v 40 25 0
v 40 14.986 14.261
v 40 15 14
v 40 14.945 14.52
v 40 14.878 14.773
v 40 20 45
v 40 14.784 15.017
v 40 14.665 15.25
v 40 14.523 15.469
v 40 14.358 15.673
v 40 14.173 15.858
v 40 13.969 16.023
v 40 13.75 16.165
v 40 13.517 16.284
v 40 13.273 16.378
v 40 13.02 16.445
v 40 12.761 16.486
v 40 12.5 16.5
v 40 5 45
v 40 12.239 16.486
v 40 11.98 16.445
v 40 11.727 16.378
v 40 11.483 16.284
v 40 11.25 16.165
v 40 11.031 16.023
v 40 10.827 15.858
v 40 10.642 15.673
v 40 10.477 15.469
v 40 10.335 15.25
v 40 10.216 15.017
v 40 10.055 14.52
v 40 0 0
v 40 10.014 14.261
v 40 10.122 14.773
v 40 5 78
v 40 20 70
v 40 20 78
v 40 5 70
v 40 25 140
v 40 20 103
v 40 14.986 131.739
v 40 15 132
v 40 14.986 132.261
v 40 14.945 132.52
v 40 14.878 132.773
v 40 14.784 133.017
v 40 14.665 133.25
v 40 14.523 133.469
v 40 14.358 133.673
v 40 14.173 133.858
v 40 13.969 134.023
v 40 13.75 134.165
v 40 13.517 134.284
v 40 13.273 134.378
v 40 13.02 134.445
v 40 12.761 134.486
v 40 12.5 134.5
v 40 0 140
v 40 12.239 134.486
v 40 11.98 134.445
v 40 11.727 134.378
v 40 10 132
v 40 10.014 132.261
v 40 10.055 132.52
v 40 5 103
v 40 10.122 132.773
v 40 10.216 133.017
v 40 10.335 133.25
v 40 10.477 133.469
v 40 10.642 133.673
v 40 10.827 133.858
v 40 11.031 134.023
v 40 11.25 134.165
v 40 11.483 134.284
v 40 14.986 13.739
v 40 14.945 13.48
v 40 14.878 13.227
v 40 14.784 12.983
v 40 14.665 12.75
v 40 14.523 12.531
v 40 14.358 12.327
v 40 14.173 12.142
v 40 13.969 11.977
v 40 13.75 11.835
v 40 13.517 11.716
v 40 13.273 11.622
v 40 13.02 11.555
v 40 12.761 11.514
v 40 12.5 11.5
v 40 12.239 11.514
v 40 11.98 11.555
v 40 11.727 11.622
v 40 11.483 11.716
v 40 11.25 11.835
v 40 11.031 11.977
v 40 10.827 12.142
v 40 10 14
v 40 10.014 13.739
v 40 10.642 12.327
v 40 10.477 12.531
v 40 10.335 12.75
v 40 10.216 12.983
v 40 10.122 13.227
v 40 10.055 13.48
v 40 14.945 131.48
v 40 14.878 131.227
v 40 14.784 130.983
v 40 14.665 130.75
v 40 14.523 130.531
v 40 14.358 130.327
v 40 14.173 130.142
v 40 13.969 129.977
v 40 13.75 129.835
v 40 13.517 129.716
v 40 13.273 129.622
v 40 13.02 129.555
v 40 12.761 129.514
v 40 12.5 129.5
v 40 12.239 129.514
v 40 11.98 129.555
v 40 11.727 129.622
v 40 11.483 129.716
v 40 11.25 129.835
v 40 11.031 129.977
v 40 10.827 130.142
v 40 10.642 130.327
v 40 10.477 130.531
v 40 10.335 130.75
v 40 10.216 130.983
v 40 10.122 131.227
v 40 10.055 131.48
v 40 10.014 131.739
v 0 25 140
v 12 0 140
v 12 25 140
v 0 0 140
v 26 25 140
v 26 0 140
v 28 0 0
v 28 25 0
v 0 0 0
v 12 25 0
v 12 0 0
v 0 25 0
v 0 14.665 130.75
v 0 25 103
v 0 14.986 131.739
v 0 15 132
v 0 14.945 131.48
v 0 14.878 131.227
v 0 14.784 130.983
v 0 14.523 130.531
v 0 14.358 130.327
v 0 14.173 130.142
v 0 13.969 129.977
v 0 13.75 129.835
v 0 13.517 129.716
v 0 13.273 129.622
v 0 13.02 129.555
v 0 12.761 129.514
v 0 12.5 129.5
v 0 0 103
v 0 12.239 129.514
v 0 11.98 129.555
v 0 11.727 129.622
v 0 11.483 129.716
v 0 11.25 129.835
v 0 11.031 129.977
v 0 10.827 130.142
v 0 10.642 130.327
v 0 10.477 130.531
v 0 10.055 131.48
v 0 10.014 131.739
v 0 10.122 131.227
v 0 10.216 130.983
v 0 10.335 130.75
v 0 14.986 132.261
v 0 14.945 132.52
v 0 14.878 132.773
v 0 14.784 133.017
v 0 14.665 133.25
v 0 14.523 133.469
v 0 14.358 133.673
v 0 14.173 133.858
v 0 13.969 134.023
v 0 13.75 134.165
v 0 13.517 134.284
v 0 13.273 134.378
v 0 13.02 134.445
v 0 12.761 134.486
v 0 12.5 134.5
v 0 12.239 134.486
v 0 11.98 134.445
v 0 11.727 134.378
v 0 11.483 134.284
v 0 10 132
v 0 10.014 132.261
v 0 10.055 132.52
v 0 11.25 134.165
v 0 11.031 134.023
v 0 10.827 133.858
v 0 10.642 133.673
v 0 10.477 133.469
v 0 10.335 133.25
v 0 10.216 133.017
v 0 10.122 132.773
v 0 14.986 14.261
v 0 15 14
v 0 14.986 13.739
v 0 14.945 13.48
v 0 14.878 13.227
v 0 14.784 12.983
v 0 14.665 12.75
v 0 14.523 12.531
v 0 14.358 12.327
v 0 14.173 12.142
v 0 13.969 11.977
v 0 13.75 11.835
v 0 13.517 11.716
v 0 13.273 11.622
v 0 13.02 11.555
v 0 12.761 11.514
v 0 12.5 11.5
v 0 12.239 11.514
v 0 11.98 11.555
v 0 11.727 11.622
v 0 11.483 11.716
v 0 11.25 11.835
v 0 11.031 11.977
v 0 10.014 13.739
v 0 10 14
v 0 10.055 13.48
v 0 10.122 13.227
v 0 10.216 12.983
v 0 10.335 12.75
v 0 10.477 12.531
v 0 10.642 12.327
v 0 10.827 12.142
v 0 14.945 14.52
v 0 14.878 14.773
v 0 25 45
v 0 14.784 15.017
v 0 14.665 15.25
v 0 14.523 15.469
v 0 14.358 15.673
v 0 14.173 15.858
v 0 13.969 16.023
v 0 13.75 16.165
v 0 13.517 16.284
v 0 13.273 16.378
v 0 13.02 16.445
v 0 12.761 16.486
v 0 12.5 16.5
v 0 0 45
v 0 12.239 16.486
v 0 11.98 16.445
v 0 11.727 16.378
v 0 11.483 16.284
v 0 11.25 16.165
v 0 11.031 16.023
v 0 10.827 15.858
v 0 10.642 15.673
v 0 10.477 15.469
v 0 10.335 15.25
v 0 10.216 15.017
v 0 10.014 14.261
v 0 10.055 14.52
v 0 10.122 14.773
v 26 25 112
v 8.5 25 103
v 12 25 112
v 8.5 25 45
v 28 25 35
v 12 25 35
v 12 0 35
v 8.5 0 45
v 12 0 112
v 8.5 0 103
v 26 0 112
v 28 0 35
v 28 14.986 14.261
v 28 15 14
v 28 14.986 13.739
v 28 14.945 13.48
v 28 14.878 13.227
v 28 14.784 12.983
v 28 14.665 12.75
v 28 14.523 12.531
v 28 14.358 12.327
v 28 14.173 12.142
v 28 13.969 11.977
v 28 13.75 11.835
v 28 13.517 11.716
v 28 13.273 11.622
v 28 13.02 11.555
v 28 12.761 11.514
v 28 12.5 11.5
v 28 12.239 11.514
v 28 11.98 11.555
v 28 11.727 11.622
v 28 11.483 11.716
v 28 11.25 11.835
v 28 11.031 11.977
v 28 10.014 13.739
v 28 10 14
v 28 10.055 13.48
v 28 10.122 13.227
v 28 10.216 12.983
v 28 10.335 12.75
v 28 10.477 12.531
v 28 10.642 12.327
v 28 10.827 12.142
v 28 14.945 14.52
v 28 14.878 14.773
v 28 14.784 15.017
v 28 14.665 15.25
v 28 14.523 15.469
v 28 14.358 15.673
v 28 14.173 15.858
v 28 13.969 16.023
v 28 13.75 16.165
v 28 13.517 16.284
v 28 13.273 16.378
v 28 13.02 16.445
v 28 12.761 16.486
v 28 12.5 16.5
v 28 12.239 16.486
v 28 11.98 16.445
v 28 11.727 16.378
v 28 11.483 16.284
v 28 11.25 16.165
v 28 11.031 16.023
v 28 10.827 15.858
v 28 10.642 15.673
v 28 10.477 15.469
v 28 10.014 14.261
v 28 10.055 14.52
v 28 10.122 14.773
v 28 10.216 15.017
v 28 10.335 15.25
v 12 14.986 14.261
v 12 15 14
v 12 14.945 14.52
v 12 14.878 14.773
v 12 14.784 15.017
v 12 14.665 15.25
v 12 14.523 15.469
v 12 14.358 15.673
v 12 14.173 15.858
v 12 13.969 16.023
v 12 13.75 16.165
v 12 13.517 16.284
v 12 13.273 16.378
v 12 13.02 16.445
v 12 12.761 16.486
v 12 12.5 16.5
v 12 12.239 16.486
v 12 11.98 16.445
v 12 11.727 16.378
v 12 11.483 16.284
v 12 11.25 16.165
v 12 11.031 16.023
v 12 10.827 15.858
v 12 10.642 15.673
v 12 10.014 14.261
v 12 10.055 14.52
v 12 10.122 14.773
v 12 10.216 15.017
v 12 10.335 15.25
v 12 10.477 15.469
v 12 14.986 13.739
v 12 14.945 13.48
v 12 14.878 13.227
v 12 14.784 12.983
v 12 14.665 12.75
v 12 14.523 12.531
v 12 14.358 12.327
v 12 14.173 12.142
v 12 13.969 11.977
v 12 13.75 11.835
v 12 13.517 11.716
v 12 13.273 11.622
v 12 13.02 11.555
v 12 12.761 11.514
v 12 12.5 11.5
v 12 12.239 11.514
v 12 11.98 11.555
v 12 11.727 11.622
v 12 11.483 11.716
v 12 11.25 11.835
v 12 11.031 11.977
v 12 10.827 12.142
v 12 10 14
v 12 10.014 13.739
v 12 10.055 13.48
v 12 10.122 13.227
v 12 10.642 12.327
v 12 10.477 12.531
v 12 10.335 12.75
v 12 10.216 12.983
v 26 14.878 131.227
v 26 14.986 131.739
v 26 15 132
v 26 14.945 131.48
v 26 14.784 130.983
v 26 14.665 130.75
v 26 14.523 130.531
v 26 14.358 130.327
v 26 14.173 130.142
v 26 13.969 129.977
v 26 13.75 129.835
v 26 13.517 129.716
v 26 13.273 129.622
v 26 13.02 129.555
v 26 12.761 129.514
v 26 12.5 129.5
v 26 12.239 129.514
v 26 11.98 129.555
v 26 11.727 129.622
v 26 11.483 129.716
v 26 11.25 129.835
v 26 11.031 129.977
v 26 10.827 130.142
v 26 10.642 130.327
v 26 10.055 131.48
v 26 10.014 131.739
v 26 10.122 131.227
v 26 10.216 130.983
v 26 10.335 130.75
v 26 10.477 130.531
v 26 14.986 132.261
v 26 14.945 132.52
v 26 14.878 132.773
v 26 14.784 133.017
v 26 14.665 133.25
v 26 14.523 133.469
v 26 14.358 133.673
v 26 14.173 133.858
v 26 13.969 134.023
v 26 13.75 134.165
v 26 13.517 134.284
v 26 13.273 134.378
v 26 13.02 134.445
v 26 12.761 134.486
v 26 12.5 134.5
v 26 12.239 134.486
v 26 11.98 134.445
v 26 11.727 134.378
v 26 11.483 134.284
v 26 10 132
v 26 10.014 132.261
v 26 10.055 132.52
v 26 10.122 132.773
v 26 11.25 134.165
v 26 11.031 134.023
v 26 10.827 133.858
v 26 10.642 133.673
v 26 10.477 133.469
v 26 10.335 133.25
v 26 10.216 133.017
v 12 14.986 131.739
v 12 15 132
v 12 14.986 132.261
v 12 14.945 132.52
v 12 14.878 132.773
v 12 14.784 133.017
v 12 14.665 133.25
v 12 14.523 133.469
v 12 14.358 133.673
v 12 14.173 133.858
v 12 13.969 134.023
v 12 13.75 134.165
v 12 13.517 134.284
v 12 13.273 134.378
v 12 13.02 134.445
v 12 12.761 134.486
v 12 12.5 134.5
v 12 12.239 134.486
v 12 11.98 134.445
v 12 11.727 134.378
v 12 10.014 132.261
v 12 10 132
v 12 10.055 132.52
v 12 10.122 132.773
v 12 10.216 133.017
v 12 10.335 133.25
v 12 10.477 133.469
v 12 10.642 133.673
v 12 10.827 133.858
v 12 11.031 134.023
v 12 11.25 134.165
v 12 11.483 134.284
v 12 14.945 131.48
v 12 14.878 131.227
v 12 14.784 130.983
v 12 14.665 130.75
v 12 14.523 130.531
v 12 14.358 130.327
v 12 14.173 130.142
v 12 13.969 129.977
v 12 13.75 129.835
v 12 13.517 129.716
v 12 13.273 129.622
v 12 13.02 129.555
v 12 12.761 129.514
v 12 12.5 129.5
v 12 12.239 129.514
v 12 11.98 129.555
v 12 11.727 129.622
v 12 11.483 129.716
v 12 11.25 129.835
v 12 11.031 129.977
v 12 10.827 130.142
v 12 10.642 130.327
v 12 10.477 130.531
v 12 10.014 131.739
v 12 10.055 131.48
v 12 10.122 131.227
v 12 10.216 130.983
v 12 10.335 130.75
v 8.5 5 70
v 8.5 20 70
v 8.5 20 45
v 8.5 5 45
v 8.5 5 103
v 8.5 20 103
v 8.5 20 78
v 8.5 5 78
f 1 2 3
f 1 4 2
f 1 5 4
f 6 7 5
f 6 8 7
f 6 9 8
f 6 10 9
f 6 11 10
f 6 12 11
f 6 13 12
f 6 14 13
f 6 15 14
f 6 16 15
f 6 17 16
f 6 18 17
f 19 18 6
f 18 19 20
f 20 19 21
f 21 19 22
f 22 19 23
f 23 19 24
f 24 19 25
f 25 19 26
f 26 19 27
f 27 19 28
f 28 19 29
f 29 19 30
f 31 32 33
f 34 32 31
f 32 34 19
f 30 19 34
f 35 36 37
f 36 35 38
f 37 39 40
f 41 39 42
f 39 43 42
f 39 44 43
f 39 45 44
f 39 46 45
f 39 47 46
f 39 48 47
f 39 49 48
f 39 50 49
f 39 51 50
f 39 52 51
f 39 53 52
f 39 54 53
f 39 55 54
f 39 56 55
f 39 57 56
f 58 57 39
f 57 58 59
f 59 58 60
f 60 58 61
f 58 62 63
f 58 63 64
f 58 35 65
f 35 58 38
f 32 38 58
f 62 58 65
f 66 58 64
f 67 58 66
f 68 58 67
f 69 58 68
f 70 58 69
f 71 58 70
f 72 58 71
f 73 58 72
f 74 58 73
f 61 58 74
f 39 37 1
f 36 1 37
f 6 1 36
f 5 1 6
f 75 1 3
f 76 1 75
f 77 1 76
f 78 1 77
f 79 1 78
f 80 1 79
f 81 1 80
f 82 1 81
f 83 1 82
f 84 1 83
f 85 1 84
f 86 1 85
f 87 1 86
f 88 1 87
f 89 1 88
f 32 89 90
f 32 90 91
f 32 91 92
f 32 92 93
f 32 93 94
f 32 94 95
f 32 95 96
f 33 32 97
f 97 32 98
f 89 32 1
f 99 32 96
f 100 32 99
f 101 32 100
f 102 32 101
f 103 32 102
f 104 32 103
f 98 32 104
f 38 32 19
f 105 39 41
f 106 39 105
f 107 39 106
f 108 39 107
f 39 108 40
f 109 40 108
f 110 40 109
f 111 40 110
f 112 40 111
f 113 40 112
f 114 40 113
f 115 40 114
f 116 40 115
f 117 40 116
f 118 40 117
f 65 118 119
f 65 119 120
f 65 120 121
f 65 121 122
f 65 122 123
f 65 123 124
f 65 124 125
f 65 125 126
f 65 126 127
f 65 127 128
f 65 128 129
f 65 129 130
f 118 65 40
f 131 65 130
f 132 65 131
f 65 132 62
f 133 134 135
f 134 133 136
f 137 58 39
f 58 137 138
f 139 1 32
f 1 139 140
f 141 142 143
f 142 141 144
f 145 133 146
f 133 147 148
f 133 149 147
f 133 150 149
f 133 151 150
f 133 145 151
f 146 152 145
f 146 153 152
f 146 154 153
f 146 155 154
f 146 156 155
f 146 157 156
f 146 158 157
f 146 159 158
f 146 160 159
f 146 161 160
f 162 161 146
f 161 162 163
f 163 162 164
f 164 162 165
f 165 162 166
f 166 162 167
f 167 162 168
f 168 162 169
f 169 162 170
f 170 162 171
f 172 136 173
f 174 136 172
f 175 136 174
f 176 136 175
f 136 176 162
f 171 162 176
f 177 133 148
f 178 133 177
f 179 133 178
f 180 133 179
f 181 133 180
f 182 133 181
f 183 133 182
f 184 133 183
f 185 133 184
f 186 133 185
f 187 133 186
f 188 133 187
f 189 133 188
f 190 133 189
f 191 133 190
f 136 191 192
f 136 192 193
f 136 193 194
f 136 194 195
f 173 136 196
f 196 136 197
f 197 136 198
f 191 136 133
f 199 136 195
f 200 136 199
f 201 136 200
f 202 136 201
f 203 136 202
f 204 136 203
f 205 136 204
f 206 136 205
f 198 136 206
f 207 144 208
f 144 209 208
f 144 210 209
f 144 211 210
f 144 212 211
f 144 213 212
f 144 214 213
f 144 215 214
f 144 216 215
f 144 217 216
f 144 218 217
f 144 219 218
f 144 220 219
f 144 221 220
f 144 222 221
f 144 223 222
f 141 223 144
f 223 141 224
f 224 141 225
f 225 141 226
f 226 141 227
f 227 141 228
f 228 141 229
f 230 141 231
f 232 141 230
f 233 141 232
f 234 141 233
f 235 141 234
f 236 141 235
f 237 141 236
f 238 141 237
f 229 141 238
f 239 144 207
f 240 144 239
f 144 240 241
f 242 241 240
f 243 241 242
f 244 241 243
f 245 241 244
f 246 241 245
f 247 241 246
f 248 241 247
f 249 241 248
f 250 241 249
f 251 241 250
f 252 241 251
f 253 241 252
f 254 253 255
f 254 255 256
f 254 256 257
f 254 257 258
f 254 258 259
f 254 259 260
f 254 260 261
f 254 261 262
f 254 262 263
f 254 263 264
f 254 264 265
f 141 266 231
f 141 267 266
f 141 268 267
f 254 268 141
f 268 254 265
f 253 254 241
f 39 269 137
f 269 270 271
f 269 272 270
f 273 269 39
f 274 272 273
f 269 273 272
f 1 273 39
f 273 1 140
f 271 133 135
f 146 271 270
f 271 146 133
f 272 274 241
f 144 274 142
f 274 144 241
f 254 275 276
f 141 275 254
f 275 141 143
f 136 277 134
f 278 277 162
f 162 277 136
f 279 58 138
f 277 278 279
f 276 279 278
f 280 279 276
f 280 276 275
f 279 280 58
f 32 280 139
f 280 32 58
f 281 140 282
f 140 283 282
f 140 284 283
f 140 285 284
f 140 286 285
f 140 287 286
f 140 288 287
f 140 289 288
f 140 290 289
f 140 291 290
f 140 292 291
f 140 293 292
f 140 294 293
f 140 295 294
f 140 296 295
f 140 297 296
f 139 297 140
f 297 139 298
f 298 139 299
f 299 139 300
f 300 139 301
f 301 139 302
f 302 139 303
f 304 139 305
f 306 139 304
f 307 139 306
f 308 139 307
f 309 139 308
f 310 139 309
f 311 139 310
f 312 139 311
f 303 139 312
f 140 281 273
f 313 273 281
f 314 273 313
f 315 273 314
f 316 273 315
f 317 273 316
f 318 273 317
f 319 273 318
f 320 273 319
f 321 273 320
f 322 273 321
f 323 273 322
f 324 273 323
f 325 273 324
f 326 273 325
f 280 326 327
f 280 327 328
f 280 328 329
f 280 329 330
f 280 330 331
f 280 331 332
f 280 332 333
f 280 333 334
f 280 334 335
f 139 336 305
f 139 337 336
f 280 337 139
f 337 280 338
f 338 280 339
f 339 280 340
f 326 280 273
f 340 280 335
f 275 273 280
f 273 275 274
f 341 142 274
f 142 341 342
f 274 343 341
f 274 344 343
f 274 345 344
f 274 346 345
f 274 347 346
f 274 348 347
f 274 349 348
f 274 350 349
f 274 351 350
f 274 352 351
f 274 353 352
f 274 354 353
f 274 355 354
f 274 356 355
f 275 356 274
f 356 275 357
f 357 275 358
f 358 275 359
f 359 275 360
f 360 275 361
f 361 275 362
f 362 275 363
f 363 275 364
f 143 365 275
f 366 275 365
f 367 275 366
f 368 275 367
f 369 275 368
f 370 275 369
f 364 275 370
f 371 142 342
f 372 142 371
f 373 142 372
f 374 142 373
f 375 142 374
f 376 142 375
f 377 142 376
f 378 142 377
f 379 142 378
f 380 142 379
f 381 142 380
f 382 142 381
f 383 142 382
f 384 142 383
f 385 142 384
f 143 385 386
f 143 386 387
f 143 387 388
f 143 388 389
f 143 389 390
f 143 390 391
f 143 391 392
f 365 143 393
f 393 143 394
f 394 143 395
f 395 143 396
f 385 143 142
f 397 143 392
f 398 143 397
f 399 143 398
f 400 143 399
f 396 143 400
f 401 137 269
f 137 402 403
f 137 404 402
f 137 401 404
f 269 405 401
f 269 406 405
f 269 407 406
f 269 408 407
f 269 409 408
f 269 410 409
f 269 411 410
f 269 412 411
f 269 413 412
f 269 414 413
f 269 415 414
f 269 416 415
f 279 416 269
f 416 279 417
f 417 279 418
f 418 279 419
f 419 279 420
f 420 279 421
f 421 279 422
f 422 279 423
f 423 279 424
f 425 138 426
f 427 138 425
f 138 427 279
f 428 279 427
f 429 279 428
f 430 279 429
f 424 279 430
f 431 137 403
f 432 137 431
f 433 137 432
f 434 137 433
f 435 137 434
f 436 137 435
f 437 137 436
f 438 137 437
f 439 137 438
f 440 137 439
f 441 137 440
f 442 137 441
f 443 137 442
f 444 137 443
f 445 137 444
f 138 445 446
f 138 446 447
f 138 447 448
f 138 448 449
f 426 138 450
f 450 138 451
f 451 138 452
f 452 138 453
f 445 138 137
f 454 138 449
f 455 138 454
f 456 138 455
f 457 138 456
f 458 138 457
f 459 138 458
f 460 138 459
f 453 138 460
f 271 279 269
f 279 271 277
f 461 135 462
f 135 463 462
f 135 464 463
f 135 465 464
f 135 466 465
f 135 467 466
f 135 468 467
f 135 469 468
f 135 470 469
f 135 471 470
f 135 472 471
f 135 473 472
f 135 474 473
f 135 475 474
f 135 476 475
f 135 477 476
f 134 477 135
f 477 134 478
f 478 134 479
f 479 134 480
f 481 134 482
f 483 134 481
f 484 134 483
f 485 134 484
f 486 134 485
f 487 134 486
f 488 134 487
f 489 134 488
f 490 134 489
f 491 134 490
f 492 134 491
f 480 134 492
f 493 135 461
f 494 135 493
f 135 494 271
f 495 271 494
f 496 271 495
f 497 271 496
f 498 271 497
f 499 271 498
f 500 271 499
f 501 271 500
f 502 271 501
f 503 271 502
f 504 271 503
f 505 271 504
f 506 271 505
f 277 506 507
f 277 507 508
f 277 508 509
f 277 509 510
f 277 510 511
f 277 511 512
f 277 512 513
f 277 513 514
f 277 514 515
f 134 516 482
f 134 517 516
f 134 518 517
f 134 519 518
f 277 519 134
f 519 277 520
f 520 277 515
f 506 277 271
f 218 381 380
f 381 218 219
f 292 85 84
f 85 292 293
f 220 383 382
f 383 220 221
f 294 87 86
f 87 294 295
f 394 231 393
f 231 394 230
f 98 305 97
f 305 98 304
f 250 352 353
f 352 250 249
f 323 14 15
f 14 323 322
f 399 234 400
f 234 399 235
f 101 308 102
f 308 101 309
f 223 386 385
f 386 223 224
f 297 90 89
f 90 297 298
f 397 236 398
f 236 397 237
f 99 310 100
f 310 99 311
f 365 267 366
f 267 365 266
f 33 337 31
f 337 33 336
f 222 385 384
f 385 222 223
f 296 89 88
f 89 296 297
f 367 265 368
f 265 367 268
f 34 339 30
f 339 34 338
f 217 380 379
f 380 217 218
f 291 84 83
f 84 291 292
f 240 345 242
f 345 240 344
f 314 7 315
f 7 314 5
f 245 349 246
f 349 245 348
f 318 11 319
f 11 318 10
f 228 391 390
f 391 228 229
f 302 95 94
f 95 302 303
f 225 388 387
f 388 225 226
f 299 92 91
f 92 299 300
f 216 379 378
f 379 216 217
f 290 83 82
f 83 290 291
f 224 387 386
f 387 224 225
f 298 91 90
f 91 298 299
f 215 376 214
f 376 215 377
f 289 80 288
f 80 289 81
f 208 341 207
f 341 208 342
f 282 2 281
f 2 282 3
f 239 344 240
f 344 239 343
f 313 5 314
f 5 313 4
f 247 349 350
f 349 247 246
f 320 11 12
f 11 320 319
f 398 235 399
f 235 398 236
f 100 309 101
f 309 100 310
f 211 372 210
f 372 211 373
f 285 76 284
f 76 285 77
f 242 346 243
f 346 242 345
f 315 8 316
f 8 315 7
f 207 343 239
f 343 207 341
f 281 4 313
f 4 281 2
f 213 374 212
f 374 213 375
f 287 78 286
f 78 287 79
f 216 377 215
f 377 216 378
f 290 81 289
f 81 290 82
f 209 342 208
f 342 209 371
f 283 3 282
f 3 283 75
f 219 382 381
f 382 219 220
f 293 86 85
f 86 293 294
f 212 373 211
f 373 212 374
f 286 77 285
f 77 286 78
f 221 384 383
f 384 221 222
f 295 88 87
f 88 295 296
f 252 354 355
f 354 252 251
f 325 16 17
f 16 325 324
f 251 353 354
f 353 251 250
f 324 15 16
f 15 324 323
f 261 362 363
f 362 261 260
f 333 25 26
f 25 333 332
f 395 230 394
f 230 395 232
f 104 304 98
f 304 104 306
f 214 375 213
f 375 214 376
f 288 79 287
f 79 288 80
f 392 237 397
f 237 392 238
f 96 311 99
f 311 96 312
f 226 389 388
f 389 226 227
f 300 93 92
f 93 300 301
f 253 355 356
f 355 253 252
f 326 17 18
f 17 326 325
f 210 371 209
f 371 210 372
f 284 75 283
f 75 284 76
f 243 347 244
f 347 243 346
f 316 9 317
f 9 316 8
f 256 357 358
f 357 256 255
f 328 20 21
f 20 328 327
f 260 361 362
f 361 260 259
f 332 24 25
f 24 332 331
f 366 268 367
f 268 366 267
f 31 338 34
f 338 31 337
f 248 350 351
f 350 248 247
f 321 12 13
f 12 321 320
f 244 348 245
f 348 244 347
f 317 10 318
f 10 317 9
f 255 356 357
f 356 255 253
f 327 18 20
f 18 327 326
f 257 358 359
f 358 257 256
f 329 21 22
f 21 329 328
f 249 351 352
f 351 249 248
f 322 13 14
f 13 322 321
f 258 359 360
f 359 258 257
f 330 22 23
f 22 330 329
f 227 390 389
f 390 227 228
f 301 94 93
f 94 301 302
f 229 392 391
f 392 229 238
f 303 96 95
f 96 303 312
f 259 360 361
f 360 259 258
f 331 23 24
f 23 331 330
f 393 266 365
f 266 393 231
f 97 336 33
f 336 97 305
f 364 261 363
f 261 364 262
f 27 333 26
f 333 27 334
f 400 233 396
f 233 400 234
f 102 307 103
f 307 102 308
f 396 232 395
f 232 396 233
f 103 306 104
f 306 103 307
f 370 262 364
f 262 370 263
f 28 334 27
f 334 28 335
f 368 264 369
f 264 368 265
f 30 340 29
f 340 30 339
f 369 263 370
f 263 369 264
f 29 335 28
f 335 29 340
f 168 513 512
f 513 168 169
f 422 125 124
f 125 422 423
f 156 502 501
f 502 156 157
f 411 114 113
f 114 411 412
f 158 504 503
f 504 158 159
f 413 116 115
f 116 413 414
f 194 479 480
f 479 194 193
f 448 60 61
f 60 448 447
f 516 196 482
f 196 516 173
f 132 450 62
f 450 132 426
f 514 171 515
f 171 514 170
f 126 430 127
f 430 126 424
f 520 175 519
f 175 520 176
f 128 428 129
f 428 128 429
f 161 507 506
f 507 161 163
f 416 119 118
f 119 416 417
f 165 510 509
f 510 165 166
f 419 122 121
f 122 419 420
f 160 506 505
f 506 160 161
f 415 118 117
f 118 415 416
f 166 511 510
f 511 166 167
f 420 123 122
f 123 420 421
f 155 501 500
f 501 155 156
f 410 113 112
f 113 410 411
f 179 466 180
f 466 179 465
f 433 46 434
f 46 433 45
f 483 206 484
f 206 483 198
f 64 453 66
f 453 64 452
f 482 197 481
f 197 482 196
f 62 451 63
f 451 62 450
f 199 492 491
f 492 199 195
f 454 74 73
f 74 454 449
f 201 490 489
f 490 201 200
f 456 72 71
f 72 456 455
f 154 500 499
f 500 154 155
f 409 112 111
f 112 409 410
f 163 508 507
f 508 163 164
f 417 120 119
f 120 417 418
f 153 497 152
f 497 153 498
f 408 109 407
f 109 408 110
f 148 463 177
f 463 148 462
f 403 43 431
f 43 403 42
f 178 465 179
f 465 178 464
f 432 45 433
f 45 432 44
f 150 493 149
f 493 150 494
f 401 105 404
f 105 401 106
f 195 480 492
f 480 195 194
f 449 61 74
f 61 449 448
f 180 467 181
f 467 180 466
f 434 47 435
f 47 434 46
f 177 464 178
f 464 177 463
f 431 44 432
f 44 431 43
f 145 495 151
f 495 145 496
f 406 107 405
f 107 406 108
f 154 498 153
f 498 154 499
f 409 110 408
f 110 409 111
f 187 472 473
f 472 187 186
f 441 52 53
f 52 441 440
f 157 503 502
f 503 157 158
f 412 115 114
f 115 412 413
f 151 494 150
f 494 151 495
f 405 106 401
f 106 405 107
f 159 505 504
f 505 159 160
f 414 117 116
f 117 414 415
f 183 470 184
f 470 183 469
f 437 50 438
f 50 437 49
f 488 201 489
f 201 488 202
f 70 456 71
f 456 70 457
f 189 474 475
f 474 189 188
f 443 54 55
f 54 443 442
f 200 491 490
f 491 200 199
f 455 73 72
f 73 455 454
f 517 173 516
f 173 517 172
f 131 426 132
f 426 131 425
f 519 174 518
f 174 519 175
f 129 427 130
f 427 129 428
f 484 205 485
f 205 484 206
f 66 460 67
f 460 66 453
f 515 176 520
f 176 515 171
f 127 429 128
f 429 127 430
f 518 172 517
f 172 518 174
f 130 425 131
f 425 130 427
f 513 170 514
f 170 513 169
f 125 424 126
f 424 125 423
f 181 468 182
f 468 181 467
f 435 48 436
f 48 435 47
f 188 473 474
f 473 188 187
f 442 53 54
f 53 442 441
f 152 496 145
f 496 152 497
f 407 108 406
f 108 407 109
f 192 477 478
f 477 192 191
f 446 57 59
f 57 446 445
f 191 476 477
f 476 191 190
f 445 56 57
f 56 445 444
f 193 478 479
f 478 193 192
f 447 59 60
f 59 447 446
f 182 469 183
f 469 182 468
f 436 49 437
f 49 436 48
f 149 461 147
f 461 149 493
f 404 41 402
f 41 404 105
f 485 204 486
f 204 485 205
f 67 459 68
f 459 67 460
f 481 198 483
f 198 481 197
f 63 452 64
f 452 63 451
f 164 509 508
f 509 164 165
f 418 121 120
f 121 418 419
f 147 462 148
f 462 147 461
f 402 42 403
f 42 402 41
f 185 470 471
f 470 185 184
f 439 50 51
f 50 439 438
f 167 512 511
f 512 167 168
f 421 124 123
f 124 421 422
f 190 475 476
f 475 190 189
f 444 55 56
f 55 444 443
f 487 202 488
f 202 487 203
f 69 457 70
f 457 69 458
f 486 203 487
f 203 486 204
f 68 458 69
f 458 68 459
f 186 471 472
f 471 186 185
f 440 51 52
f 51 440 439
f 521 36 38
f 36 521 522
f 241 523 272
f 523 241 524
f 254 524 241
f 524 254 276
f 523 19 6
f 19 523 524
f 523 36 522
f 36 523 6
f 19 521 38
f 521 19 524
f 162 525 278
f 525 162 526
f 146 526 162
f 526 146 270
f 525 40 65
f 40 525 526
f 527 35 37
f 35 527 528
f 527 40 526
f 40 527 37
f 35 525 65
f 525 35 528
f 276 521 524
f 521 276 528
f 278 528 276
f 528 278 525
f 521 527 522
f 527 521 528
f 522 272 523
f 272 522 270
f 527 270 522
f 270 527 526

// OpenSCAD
$fn = 60;
cut_margin = 5;
rough_x = 40;
rough_y = 25;
rough_z = 140;

bottom_cut_x = 16;
bottom_cut_y = rough_y + cut_margin;
bottom_cut_z = 40;

module bottom_cut() {
       cube([bottom_cut_x, bottom_cut_y, bottom_cut_z]);
}


top_cut_x = 14;
top_cut_y = rough_y;
top_cut_z = 33;

module top_cut() {
       cube([top_cut_x, top_cut_y+cut_margin, top_cut_z+cut_margin]);
}



z_to_hole = 14;

module bottom_holes() {
      color([0.4, 0,0.4]){
        translate([-cut_margin,rough_y/2,z_to_hole]){
          rotate([0,90,0]) cylinder(d=5, h=rough_x + (2 * cut_margin));
        }
      }
}

z_bot_hole_to_top_hole = 118;

module top_holes() {
      color([0.4, 0,0.4]){
        translate([-cut_margin,rough_y/2,z_to_hole+z_bot_hole_to_top_hole]){
          rotate([0,90,0]) cylinder(d=5, h=rough_x + (2 * cut_margin));
        }
      }
}

z_to_first_weight_optimization_cut = 45;
weight_optimization_z = 25;
weight_optimization_y = 15;
weight_optimization_x = rough_x + (2 * cut_margin);
hole_seperation_space = 8;
hole_seperation_translate_z = weight_optimization_z + hole_seperation_space;

module weight_optimization_cut(index) {
      color([0.4, 0,0.4]){
        translate([-cut_margin,rough_y/2-weight_optimization_y/2, z_to_first_weight_optimization_cut+(index*hole_seperation_translate_z)]){
          rotate([0,0,0]) cube([weight_optimization_x, weight_optimization_y, weight_optimization_z]);
        }
      }
}

taper_z = 58;
taper_x = 8.5 + cut_margin;
taper_y = rough_y + (2*cut_margin);
x_axis_taper_translate_z = z_to_first_weight_optimization_cut;

module x_axis_taper() {
      color([0.4, 0,0.4]){
                  translate([-cut_margin,-cut_margin, x_axis_taper_translate_z]) {
                    cube([taper_x, taper_y, taper_z]);
                  }
      }
}

difference() {
  color([0,0, 0.8]) cube([rough_x, rough_y, rough_z]);
  color([0.4, 0,0.4]) translate([rough_x/2-bottom_cut_x/2, -cut_margin/2, -cut_margin]) bottom_cut();
  color([0.4, 0,0.4]) translate([rough_x/2-bottom_cut_x/2, -cut_margin/2, rough_z-top_cut_z+cut_margin]) top_cut();
  bottom_holes();
  top_holes();
  weight_optimization_cut(0);
  weight_optimization_cut(1);
  x_axis_taper();
}
